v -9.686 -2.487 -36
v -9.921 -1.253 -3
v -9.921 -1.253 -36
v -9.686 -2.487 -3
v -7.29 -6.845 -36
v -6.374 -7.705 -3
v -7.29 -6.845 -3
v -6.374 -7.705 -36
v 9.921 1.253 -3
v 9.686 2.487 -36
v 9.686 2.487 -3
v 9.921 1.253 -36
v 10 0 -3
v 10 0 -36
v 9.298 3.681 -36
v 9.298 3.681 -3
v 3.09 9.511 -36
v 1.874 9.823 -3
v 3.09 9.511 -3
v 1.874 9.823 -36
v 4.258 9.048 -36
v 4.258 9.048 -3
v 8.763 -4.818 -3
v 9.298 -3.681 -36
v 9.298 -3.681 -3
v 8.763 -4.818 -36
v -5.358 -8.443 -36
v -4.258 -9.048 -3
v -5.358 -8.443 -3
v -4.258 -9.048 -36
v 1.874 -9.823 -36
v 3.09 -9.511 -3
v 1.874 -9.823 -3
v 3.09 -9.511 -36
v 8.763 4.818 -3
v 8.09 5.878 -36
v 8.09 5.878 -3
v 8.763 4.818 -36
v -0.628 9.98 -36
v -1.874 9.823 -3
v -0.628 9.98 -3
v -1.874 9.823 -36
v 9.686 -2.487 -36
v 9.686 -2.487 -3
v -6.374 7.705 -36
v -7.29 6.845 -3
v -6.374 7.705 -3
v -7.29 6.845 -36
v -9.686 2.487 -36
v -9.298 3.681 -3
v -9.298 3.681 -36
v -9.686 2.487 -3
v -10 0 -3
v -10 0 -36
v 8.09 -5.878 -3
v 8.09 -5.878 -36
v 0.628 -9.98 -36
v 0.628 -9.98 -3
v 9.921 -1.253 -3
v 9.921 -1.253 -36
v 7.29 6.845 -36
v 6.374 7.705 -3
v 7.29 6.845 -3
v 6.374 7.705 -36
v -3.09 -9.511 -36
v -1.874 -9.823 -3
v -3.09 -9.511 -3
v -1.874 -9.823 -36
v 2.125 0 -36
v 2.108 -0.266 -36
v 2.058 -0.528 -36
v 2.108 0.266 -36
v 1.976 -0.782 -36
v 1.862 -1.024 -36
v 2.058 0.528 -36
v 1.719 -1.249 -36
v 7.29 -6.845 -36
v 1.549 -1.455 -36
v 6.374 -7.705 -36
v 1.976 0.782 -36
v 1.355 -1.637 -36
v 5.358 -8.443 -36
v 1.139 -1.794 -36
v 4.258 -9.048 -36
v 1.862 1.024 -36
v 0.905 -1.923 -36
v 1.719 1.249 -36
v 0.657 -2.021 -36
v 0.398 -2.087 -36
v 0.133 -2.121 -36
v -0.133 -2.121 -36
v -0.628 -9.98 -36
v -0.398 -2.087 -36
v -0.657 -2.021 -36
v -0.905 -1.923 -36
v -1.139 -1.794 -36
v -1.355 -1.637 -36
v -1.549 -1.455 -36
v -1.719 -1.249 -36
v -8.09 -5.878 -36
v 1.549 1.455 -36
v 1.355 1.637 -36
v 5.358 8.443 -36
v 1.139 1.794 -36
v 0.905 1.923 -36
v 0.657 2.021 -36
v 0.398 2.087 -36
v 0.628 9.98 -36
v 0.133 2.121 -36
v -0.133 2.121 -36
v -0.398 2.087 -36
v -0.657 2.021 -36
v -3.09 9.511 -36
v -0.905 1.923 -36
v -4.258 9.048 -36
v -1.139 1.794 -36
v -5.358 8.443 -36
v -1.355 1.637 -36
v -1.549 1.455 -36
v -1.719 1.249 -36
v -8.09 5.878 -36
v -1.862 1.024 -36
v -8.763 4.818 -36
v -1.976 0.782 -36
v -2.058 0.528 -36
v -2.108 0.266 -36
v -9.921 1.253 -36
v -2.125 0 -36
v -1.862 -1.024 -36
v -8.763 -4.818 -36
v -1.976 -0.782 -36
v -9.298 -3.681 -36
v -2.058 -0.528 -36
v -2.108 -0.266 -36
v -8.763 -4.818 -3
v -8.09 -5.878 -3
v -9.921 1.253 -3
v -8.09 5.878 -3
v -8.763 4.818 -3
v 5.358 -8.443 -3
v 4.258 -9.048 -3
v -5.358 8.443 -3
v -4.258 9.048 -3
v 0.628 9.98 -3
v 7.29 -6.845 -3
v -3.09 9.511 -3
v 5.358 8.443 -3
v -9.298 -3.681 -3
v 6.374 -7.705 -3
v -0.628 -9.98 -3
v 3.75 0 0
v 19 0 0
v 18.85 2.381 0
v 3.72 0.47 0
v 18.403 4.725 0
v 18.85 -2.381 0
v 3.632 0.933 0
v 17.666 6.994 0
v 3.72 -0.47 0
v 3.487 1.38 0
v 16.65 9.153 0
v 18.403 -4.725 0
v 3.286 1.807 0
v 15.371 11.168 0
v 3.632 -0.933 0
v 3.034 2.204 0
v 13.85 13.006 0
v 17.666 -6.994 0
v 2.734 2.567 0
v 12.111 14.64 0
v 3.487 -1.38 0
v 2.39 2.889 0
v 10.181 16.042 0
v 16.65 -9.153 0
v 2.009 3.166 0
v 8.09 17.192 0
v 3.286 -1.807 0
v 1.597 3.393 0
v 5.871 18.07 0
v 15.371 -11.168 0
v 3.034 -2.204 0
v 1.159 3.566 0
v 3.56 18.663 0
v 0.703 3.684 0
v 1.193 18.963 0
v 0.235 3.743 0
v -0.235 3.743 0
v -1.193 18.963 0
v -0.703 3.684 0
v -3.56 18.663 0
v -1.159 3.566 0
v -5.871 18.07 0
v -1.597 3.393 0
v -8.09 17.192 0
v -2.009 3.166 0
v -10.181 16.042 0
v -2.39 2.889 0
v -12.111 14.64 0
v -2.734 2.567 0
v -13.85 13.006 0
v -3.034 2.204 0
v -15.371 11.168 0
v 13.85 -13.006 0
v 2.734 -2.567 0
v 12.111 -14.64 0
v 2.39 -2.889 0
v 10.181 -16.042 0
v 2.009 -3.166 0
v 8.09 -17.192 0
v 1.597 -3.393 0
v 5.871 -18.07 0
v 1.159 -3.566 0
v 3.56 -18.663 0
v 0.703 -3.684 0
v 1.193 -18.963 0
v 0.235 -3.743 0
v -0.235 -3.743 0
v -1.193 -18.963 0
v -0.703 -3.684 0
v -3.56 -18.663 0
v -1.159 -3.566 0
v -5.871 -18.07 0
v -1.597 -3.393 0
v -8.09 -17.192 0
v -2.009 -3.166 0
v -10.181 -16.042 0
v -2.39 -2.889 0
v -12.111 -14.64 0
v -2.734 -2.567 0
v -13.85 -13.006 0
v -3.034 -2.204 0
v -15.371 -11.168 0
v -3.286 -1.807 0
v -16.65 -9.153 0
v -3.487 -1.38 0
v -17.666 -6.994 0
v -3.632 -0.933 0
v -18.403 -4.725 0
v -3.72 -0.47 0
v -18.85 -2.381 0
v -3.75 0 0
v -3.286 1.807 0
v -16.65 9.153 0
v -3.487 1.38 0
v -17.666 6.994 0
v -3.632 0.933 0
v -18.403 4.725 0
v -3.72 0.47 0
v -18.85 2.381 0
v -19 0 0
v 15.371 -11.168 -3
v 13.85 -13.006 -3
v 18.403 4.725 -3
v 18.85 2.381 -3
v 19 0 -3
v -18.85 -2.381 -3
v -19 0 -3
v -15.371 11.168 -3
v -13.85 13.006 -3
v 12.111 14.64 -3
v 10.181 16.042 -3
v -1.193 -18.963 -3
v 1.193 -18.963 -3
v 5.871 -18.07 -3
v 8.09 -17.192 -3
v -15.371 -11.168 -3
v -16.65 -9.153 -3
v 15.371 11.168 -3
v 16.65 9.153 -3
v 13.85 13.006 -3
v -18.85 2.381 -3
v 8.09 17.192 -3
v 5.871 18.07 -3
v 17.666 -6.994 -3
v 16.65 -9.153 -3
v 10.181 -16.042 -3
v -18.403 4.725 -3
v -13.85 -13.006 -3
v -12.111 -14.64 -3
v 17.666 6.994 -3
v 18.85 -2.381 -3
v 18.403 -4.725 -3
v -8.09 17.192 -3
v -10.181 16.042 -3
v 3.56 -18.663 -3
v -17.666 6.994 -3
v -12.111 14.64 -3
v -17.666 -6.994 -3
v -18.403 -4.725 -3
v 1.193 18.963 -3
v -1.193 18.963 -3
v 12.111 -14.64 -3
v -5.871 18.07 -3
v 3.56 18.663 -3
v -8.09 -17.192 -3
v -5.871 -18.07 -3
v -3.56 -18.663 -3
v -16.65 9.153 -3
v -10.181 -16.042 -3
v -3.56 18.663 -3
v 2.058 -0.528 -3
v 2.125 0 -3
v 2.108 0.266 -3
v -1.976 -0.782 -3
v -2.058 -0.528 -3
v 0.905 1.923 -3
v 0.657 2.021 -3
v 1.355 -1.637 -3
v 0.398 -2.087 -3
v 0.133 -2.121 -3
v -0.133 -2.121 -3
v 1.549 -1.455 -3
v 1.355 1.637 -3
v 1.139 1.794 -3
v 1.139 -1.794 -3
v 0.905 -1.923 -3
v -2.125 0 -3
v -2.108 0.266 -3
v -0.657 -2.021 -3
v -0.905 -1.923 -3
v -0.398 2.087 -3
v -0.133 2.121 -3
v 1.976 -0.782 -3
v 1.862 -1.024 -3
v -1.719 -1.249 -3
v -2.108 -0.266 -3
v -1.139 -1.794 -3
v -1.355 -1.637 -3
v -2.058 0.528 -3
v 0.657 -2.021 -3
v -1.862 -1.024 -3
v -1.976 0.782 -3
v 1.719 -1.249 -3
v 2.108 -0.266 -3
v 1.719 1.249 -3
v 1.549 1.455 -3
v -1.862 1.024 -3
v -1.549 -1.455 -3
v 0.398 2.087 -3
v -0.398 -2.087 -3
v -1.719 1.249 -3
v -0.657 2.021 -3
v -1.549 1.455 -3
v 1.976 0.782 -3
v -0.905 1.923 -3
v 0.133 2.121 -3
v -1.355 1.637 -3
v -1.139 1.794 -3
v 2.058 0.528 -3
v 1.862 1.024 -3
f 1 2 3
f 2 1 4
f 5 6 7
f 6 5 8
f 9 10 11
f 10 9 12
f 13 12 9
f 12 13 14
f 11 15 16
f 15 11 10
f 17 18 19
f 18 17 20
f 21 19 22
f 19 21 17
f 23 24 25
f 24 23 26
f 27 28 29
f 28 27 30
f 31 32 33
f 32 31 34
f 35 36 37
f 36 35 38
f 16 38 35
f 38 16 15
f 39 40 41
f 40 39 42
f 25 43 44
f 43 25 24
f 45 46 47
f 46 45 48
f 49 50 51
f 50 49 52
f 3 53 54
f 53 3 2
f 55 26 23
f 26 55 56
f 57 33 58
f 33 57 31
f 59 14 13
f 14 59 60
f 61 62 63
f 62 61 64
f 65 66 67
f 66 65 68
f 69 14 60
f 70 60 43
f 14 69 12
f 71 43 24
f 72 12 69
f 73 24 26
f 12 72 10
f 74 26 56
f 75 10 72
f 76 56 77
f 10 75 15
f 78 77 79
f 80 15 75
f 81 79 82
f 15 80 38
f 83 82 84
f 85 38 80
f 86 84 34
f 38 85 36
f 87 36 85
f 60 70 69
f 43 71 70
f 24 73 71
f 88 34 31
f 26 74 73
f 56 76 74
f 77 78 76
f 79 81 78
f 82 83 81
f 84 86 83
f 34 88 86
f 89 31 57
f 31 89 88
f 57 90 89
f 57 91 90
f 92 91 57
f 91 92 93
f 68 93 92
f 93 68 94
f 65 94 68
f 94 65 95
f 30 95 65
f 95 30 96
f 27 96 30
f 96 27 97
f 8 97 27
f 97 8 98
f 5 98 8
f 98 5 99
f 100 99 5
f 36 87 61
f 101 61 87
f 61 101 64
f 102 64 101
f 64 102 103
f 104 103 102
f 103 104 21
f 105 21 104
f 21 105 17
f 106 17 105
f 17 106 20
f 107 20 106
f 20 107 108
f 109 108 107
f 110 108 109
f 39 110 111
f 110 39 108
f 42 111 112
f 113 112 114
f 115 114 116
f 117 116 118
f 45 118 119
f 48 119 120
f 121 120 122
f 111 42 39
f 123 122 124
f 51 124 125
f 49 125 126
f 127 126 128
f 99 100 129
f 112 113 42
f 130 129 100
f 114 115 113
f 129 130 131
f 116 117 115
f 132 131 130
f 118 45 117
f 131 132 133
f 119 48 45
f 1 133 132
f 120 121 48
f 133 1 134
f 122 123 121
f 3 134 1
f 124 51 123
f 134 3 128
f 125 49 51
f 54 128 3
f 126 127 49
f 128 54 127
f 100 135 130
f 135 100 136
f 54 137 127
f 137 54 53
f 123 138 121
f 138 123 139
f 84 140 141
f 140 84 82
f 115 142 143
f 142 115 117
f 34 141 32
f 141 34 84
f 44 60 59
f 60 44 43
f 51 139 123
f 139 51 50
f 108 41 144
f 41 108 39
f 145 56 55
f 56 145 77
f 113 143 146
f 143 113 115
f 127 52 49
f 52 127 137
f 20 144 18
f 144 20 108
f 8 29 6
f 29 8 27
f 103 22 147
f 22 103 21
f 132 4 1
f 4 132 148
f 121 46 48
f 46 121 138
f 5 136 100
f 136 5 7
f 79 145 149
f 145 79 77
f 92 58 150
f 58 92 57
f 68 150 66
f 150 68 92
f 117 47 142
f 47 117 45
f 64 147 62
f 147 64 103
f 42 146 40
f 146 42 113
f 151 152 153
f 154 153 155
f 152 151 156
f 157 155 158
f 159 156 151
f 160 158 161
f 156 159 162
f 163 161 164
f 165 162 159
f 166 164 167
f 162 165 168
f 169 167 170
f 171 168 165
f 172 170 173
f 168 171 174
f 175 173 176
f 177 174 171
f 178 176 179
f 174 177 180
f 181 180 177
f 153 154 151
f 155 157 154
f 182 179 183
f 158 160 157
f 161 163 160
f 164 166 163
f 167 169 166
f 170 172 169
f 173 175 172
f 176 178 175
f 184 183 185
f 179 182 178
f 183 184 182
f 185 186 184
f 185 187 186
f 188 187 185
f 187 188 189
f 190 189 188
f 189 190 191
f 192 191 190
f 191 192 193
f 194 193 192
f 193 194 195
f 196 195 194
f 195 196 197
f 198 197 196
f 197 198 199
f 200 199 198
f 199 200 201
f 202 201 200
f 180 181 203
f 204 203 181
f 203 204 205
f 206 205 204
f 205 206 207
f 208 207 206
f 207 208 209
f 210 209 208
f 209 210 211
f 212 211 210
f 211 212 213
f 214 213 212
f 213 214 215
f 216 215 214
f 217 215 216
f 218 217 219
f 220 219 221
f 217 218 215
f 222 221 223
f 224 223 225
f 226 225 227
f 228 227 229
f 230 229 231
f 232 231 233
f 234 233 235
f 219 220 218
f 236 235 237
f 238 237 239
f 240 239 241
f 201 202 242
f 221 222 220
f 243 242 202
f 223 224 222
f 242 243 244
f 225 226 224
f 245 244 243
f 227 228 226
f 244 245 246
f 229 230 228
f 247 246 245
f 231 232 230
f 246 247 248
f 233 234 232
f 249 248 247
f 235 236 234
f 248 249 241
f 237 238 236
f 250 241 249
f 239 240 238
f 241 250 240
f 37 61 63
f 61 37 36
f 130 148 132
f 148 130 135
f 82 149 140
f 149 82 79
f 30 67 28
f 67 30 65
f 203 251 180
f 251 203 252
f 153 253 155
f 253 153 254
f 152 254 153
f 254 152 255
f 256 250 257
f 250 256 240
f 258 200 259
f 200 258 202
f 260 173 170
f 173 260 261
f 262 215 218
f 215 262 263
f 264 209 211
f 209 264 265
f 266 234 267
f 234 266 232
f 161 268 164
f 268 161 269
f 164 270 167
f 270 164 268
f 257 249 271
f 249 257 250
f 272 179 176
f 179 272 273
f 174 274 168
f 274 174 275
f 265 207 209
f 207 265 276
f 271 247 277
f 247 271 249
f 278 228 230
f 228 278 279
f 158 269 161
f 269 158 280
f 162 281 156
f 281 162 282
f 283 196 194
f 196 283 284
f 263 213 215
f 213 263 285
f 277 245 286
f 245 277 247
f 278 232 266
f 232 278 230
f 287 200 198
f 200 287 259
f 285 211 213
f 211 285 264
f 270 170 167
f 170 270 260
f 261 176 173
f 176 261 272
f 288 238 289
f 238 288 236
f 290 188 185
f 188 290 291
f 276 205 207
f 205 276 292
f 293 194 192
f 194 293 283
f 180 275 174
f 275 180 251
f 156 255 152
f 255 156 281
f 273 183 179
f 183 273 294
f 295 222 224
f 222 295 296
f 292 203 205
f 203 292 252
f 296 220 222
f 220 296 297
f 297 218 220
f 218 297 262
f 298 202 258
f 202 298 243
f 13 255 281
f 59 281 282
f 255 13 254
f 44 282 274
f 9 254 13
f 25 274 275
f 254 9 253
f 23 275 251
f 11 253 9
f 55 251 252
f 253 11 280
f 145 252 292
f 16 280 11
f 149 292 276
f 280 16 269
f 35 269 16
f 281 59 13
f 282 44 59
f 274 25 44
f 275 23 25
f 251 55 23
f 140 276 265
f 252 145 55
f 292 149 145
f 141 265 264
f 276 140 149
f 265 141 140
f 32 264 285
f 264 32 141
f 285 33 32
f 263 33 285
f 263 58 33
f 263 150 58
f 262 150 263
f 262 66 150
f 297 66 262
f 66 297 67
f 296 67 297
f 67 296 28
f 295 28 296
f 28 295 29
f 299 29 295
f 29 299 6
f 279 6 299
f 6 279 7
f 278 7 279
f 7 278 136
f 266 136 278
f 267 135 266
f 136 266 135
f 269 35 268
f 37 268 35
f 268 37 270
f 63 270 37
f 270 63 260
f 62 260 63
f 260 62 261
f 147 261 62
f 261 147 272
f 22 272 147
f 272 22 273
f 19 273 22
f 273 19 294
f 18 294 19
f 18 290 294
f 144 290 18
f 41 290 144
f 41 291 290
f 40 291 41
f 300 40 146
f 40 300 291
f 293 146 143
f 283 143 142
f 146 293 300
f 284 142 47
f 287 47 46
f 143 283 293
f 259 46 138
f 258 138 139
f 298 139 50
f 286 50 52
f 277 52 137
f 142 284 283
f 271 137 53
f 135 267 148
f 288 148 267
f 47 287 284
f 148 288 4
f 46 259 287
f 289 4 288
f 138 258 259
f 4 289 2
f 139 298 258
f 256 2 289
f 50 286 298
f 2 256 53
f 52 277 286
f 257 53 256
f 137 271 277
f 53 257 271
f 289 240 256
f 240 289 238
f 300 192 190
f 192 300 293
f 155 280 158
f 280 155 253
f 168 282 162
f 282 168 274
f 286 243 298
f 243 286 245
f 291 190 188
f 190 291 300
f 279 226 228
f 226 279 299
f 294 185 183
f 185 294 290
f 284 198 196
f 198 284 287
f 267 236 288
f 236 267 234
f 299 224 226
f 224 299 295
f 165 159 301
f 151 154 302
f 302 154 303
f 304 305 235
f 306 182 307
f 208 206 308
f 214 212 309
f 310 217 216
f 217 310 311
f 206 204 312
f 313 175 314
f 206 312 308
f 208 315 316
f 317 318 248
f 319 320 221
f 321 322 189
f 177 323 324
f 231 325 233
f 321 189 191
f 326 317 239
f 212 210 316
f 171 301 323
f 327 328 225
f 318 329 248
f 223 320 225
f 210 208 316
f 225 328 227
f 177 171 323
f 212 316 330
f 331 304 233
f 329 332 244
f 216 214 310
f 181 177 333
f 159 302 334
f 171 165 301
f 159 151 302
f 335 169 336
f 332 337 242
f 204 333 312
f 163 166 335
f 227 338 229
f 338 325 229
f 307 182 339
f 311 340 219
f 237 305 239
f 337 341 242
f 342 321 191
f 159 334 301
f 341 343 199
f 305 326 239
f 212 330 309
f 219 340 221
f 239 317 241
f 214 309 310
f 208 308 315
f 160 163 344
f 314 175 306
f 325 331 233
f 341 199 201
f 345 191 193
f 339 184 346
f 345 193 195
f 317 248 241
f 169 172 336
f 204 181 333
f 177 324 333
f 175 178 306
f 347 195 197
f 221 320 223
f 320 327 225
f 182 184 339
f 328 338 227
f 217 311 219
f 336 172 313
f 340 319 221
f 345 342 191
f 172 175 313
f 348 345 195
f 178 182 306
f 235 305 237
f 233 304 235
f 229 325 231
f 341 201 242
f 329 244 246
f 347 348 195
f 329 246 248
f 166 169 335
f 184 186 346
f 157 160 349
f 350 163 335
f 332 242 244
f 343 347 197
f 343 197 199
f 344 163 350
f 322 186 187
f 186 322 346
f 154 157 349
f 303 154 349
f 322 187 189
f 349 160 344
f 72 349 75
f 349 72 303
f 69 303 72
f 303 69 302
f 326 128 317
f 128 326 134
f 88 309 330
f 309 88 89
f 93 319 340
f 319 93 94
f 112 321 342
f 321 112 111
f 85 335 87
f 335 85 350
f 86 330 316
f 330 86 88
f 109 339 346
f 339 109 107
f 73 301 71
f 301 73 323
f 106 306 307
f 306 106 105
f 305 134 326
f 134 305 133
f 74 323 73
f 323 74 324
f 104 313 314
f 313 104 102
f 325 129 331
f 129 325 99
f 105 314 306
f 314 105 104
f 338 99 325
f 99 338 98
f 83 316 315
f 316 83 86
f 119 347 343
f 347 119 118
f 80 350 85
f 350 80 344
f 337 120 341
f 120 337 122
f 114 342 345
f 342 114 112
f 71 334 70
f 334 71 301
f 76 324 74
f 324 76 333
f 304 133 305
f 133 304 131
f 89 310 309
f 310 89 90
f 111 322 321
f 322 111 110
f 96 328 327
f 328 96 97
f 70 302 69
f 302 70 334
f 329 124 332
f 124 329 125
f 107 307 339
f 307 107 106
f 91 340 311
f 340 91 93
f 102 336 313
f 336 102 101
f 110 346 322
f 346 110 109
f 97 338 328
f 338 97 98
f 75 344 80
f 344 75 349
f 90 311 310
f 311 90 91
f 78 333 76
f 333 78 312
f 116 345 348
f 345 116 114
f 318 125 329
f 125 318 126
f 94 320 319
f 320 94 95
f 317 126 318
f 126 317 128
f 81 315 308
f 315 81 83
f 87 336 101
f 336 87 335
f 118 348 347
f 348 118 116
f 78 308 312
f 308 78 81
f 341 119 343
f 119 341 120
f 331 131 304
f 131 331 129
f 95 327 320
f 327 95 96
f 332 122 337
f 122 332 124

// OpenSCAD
$fn = 50;


difference() {
	union() {
		translate(v = [0, 0, -36.0000000000]) {
			cylinder(h = 36, r = 10.0000000000);
		}
		translate(v = [0, 0, -3.0000000000]) {
			cylinder(h = 3, r = 19.0000000000);
		}
	}
	union() {
		translate(v = [0, 0, 0]) {
			rotate(a = [0, 0, 0]) {
				difference() {
					union() {
						#translate(v = [0, 0, -36.0000000000]) {
							cylinder(h = 36, r = 2.0000000000);
						}
						#translate(v = [0, 0, -3]) {
							cylinder(h = 3, r = 10.0000000000, r1 = 2.1250000000, r2 = 3.7500000000);
						}
						#translate(v = [0, 0, -36.0000000000]) {
							cylinder(h = 36, r = 2.1250000000);
						}
						#translate(v = [0, 0, -36.0000000000]) {
							cylinder(h = 36, r = 2.0000000000);
						}
					}
					union();
				}
			}
		}
	}
}
